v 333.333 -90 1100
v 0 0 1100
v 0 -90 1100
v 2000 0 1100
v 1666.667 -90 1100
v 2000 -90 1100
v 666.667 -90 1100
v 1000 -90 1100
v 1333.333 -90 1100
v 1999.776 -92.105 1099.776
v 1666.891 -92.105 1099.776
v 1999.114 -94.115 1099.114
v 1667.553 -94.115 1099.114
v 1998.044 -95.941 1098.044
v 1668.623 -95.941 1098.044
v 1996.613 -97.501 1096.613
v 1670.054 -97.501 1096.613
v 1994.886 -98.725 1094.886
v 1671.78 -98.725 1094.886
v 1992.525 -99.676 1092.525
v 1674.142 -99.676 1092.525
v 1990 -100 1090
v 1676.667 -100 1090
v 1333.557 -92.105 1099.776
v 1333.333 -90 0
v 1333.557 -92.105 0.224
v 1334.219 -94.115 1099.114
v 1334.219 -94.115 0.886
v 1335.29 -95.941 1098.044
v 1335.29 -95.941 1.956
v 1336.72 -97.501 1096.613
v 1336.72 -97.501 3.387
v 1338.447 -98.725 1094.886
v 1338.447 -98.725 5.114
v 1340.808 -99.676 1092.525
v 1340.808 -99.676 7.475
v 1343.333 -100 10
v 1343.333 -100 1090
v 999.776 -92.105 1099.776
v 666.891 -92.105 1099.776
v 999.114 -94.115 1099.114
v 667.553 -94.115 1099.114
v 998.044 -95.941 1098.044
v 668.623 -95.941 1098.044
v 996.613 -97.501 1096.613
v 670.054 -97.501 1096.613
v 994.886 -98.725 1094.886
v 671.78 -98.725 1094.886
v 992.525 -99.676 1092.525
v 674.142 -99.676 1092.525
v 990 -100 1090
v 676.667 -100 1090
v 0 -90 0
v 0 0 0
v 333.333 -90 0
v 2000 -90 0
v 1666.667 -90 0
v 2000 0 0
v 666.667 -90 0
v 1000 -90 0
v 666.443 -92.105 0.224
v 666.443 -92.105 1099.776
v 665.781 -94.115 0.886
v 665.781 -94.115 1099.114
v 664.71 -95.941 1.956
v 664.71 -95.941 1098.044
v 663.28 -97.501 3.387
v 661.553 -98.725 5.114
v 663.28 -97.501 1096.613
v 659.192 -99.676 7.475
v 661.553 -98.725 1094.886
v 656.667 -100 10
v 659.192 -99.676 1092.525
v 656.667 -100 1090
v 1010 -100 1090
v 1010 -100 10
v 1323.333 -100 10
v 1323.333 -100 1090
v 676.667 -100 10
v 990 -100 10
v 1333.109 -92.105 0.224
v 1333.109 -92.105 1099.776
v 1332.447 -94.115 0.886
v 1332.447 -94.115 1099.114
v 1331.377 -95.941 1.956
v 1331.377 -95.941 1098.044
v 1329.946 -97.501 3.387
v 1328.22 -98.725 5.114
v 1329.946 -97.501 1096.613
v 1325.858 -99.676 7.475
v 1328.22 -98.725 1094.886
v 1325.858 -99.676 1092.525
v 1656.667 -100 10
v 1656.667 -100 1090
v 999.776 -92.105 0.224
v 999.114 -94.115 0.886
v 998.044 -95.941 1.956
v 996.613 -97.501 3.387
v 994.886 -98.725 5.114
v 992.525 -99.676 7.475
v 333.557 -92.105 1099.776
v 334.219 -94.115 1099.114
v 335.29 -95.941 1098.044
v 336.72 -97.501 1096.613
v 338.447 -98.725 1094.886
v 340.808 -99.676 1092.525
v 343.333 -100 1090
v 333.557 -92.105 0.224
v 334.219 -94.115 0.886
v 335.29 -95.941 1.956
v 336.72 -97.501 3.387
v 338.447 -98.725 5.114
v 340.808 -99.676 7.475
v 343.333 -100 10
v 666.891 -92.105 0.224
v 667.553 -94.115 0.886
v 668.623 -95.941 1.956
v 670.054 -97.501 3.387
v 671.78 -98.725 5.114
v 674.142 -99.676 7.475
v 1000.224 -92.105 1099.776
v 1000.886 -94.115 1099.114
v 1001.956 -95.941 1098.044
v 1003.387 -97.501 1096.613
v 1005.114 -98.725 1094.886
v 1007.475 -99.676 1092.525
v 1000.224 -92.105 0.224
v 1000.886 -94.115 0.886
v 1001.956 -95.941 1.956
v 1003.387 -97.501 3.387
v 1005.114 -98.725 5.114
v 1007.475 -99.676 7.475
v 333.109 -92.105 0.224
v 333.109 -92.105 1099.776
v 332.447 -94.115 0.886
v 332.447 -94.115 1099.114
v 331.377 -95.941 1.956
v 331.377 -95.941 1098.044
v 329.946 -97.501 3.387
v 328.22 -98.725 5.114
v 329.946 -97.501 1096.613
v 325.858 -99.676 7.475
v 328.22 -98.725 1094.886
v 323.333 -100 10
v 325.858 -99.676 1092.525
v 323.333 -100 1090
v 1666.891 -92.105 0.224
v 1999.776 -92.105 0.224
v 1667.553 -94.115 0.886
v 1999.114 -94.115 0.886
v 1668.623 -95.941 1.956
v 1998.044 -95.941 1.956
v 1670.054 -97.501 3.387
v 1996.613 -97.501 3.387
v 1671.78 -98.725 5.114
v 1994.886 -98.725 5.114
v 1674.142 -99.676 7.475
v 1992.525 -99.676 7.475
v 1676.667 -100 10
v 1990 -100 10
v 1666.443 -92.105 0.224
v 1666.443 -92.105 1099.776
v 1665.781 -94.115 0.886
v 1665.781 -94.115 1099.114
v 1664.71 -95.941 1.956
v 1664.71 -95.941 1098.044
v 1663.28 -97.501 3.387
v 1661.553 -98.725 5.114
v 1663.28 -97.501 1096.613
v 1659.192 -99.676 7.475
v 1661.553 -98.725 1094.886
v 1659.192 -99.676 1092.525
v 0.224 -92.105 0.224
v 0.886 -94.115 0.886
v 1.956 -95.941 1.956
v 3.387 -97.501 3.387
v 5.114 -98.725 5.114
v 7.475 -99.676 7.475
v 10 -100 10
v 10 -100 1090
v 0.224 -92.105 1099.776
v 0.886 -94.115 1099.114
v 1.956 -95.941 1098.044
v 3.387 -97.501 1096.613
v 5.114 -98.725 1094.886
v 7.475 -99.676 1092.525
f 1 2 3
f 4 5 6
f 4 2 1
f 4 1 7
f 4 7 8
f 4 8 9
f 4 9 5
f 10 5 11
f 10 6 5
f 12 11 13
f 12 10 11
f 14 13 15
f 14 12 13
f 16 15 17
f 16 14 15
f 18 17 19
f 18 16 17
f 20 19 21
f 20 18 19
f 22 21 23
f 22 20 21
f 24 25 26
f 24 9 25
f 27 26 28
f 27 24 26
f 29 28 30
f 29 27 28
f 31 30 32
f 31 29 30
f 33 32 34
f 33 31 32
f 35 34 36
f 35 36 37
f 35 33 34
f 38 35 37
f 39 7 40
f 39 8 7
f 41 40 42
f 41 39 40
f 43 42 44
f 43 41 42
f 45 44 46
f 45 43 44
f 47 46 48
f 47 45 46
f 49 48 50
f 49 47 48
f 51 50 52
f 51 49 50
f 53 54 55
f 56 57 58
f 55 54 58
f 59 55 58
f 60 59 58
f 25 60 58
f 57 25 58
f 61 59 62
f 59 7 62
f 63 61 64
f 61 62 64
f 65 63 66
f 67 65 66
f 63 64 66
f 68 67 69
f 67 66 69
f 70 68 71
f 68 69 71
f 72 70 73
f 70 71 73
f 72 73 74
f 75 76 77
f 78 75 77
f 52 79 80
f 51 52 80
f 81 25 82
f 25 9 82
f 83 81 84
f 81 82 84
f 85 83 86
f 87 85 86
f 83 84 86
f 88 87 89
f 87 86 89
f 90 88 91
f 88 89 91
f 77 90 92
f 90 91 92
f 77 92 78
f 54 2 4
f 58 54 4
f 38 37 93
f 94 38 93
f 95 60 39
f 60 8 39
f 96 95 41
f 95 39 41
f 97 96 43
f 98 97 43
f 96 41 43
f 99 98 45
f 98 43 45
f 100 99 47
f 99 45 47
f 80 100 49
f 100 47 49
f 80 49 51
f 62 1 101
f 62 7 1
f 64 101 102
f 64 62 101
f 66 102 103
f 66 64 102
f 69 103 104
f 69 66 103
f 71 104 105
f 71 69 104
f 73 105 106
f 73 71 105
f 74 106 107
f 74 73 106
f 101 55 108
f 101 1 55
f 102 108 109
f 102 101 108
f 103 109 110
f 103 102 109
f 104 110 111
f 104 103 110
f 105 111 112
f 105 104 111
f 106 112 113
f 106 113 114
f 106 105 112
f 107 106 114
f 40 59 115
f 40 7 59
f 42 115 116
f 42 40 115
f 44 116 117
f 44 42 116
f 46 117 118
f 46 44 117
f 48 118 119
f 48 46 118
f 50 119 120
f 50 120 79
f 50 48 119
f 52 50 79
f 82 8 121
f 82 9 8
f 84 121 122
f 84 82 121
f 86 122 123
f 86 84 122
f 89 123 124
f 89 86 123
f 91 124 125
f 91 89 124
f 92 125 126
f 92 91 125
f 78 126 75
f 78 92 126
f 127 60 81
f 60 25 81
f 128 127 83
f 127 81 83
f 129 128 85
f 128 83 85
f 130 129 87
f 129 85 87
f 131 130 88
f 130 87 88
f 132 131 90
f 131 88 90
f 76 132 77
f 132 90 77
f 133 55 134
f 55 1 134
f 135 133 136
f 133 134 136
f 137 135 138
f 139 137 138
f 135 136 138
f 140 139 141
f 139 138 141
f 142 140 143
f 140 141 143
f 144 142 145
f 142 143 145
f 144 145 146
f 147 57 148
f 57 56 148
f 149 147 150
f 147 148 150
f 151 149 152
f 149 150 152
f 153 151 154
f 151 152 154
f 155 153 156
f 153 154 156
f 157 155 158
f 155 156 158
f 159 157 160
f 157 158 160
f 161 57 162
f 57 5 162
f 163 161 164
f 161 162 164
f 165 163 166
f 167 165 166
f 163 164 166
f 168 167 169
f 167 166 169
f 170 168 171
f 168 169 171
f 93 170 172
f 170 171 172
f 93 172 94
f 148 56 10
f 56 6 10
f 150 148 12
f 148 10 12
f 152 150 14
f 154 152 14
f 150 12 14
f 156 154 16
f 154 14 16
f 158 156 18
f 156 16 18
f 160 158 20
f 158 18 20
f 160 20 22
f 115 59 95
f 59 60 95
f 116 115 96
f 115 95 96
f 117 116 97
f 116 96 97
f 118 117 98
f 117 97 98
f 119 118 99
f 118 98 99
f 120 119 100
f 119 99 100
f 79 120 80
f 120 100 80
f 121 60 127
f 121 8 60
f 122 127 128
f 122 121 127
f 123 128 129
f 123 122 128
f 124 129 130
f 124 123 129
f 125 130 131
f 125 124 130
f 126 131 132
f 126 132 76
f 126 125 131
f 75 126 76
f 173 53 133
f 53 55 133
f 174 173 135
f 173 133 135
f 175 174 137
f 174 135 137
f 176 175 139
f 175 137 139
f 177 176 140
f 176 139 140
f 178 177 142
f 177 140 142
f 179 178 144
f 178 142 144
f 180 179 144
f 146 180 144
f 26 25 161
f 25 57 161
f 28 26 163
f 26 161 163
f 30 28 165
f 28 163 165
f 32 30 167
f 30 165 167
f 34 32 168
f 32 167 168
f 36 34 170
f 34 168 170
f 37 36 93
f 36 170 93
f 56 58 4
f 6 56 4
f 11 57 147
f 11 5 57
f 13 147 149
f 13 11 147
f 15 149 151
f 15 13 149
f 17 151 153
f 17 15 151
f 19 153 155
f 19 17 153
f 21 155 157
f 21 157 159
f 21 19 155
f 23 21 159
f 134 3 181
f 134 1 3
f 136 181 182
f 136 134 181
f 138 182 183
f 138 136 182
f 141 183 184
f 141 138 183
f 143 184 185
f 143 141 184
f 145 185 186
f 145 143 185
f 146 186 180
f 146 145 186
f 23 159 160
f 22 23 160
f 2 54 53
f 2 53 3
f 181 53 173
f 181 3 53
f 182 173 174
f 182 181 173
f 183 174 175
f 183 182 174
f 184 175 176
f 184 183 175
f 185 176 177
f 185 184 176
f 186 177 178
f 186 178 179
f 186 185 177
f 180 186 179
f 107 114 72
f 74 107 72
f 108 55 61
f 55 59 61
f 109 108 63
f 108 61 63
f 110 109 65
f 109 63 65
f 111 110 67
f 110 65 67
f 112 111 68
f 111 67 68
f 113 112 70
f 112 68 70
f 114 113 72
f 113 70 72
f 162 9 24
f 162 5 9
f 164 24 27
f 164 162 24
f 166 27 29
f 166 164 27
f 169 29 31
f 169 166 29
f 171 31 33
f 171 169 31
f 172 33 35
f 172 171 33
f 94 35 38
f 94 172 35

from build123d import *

# Parameters (mm, degrees)
SKETCH_W      = 333.333333
SKETCH_H      = 1100
EXTRUDE_DEPTH = 100
FILLET_R      = 10
ARRAY_X_COUNT = 6
ARRAY_X_PITCH = 333.333333


with BuildPart() as part:
    # Sketch → Extrude (new body)
    with BuildSketch(Plane.XZ):
        with Locations((166.666666, 550)):
            Rectangle(SKETCH_W, SKETCH_H)
    extrude(amount=EXTRUDE_DEPTH)

    # Fillet
    fillet_edges = [part.edges().sort_by_distance(p)[0] for p in [
        (166.666667, -100, 0),
        (333.333333, -100, 550),
        (166.666667, -100, 1100),
        (0, -100, 550),
    ]]
    fillet(fillet_edges, radius=FILLET_R)

    # Array X: part ×6


with BuildPart() as part_1:
    add(part.part)
    with Locations(*[(i * ARRAY_X_PITCH, 0, 0) for i in range(1, ARRAY_X_COUNT)]):
        add(part.part)


solid = part_1.part
